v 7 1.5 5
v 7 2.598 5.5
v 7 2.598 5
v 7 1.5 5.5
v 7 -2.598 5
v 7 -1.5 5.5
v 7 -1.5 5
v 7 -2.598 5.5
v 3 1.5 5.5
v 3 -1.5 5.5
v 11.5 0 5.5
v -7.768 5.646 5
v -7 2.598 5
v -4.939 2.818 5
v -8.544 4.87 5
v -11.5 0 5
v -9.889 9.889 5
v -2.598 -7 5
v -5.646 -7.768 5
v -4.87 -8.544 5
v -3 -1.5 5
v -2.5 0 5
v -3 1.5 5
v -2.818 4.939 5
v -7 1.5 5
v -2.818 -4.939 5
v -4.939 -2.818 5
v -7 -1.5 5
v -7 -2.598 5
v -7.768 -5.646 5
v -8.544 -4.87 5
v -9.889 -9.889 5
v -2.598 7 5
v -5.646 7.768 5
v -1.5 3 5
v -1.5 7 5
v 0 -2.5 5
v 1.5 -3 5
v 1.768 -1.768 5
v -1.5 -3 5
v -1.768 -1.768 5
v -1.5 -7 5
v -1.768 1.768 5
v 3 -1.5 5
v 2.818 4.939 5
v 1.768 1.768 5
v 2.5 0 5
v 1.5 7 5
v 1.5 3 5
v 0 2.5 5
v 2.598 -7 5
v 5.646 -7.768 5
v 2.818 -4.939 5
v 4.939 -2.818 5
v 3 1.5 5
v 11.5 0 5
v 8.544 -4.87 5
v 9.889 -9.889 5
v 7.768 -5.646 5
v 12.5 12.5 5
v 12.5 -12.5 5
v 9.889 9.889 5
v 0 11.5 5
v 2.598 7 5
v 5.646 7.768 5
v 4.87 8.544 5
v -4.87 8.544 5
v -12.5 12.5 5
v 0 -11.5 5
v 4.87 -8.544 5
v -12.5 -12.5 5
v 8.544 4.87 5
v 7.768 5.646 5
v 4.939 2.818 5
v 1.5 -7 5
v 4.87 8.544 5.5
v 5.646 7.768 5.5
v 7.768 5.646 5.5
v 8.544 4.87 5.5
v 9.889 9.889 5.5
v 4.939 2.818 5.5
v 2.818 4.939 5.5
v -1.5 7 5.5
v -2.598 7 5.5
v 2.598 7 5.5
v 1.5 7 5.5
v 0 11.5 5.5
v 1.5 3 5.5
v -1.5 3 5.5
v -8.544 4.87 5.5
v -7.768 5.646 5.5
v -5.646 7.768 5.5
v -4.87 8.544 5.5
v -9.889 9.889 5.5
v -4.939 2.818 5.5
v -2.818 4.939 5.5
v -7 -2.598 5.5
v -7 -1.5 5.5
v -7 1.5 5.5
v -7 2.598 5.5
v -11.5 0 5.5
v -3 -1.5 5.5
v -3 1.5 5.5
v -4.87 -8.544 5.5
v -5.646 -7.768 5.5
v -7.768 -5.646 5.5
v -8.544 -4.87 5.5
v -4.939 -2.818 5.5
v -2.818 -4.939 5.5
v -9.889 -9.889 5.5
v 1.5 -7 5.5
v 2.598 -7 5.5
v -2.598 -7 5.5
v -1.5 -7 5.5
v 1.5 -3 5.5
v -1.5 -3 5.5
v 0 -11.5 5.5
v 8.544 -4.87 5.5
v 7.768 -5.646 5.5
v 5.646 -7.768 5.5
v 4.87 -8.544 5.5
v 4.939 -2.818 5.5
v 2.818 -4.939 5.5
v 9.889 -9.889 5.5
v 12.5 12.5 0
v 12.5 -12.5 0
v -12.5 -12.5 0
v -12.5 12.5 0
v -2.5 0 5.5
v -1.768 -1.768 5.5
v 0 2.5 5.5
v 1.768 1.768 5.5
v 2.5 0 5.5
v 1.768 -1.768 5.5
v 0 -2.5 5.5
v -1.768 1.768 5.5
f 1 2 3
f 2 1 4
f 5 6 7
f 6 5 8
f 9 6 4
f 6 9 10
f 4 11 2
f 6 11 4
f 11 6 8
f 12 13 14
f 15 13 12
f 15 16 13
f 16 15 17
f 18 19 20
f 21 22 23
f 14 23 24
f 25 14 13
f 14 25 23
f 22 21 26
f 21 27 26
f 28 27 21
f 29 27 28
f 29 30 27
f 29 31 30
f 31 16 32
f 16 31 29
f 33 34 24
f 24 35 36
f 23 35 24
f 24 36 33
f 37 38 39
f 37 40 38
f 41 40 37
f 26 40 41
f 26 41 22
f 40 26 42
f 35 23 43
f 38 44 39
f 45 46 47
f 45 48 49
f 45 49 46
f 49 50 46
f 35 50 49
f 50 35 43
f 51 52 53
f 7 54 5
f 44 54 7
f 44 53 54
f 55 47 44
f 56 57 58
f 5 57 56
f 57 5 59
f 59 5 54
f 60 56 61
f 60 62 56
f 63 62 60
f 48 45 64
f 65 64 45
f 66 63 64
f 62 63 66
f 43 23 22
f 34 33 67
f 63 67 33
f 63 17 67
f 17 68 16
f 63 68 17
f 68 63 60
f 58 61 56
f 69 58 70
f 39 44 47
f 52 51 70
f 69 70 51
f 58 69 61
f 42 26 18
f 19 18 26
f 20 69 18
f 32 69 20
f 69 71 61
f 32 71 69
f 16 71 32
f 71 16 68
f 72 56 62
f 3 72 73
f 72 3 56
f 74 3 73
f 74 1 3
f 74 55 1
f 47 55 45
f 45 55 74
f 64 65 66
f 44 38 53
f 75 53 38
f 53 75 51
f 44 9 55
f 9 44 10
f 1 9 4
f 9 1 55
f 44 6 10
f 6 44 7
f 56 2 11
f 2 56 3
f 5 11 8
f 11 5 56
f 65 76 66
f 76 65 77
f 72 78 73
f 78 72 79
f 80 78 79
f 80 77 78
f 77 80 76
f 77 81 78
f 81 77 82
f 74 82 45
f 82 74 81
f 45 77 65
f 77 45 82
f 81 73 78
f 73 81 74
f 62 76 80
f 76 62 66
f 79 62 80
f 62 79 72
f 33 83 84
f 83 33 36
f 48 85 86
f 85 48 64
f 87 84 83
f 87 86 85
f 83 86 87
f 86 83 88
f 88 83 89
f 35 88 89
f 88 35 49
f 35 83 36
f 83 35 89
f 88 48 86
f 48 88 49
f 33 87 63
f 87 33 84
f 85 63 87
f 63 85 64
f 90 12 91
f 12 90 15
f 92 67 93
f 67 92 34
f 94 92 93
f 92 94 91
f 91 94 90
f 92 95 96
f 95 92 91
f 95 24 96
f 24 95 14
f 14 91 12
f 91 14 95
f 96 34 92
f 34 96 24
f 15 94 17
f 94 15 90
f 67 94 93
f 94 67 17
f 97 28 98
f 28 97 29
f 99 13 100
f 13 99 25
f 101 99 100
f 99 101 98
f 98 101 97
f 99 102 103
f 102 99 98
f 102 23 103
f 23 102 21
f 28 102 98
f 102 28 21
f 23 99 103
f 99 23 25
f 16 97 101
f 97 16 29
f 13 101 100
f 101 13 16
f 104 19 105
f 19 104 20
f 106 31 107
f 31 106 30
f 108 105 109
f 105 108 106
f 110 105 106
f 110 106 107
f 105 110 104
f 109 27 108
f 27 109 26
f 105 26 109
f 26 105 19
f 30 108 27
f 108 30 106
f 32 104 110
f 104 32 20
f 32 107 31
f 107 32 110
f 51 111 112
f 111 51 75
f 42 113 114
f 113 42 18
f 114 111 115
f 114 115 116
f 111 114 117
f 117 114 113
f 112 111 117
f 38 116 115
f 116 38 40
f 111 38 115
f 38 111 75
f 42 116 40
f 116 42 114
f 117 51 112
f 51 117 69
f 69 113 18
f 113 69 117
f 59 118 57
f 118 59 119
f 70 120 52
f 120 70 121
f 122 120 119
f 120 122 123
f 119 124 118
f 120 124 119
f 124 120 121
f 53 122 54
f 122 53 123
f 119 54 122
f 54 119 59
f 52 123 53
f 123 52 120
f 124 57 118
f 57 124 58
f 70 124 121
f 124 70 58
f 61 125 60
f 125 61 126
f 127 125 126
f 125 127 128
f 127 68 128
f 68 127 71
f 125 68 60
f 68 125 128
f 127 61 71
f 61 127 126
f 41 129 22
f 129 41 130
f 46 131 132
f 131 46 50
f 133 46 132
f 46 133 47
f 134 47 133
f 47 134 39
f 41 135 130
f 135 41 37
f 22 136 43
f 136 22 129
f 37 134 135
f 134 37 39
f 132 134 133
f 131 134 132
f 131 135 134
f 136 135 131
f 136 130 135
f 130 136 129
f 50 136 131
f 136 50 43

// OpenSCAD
// file: common.scad
module arrow() {
    union() {
        translate([-3,-1.5,0]) cube([4,3,0.5]);
        translate([2.5,0,0]) cylinder(0.5,3,3,$fn=3);
    }
}
// main file
include <common.scad>;

color([0,0.75,1]) translate([-12.5,-12.5,0]) cube([25,25,5]);

color("red") translate([0,0,5]) cylinder(0.5,2.5,2.5);

color([1,1,1]) translate([6,0,5]) arrow();
color([1,1,1]) translate([6,6,5]) rotate(45) arrow();
color([1,1,1]) translate([0,6,5]) rotate(90) arrow();
color([1,1,1]) translate([-6,6,5]) rotate(135) arrow();
color([1,1,1]) translate([-6,0,5]) rotate(180) arrow();
color([1,1,1]) translate([-6,-6,5]) rotate(225) arrow();
color([1,1,1]) translate([0,-6,5]) rotate(270) arrow();
color([1,1,1]) translate([6,-6,5]) rotate(315) arrow();
